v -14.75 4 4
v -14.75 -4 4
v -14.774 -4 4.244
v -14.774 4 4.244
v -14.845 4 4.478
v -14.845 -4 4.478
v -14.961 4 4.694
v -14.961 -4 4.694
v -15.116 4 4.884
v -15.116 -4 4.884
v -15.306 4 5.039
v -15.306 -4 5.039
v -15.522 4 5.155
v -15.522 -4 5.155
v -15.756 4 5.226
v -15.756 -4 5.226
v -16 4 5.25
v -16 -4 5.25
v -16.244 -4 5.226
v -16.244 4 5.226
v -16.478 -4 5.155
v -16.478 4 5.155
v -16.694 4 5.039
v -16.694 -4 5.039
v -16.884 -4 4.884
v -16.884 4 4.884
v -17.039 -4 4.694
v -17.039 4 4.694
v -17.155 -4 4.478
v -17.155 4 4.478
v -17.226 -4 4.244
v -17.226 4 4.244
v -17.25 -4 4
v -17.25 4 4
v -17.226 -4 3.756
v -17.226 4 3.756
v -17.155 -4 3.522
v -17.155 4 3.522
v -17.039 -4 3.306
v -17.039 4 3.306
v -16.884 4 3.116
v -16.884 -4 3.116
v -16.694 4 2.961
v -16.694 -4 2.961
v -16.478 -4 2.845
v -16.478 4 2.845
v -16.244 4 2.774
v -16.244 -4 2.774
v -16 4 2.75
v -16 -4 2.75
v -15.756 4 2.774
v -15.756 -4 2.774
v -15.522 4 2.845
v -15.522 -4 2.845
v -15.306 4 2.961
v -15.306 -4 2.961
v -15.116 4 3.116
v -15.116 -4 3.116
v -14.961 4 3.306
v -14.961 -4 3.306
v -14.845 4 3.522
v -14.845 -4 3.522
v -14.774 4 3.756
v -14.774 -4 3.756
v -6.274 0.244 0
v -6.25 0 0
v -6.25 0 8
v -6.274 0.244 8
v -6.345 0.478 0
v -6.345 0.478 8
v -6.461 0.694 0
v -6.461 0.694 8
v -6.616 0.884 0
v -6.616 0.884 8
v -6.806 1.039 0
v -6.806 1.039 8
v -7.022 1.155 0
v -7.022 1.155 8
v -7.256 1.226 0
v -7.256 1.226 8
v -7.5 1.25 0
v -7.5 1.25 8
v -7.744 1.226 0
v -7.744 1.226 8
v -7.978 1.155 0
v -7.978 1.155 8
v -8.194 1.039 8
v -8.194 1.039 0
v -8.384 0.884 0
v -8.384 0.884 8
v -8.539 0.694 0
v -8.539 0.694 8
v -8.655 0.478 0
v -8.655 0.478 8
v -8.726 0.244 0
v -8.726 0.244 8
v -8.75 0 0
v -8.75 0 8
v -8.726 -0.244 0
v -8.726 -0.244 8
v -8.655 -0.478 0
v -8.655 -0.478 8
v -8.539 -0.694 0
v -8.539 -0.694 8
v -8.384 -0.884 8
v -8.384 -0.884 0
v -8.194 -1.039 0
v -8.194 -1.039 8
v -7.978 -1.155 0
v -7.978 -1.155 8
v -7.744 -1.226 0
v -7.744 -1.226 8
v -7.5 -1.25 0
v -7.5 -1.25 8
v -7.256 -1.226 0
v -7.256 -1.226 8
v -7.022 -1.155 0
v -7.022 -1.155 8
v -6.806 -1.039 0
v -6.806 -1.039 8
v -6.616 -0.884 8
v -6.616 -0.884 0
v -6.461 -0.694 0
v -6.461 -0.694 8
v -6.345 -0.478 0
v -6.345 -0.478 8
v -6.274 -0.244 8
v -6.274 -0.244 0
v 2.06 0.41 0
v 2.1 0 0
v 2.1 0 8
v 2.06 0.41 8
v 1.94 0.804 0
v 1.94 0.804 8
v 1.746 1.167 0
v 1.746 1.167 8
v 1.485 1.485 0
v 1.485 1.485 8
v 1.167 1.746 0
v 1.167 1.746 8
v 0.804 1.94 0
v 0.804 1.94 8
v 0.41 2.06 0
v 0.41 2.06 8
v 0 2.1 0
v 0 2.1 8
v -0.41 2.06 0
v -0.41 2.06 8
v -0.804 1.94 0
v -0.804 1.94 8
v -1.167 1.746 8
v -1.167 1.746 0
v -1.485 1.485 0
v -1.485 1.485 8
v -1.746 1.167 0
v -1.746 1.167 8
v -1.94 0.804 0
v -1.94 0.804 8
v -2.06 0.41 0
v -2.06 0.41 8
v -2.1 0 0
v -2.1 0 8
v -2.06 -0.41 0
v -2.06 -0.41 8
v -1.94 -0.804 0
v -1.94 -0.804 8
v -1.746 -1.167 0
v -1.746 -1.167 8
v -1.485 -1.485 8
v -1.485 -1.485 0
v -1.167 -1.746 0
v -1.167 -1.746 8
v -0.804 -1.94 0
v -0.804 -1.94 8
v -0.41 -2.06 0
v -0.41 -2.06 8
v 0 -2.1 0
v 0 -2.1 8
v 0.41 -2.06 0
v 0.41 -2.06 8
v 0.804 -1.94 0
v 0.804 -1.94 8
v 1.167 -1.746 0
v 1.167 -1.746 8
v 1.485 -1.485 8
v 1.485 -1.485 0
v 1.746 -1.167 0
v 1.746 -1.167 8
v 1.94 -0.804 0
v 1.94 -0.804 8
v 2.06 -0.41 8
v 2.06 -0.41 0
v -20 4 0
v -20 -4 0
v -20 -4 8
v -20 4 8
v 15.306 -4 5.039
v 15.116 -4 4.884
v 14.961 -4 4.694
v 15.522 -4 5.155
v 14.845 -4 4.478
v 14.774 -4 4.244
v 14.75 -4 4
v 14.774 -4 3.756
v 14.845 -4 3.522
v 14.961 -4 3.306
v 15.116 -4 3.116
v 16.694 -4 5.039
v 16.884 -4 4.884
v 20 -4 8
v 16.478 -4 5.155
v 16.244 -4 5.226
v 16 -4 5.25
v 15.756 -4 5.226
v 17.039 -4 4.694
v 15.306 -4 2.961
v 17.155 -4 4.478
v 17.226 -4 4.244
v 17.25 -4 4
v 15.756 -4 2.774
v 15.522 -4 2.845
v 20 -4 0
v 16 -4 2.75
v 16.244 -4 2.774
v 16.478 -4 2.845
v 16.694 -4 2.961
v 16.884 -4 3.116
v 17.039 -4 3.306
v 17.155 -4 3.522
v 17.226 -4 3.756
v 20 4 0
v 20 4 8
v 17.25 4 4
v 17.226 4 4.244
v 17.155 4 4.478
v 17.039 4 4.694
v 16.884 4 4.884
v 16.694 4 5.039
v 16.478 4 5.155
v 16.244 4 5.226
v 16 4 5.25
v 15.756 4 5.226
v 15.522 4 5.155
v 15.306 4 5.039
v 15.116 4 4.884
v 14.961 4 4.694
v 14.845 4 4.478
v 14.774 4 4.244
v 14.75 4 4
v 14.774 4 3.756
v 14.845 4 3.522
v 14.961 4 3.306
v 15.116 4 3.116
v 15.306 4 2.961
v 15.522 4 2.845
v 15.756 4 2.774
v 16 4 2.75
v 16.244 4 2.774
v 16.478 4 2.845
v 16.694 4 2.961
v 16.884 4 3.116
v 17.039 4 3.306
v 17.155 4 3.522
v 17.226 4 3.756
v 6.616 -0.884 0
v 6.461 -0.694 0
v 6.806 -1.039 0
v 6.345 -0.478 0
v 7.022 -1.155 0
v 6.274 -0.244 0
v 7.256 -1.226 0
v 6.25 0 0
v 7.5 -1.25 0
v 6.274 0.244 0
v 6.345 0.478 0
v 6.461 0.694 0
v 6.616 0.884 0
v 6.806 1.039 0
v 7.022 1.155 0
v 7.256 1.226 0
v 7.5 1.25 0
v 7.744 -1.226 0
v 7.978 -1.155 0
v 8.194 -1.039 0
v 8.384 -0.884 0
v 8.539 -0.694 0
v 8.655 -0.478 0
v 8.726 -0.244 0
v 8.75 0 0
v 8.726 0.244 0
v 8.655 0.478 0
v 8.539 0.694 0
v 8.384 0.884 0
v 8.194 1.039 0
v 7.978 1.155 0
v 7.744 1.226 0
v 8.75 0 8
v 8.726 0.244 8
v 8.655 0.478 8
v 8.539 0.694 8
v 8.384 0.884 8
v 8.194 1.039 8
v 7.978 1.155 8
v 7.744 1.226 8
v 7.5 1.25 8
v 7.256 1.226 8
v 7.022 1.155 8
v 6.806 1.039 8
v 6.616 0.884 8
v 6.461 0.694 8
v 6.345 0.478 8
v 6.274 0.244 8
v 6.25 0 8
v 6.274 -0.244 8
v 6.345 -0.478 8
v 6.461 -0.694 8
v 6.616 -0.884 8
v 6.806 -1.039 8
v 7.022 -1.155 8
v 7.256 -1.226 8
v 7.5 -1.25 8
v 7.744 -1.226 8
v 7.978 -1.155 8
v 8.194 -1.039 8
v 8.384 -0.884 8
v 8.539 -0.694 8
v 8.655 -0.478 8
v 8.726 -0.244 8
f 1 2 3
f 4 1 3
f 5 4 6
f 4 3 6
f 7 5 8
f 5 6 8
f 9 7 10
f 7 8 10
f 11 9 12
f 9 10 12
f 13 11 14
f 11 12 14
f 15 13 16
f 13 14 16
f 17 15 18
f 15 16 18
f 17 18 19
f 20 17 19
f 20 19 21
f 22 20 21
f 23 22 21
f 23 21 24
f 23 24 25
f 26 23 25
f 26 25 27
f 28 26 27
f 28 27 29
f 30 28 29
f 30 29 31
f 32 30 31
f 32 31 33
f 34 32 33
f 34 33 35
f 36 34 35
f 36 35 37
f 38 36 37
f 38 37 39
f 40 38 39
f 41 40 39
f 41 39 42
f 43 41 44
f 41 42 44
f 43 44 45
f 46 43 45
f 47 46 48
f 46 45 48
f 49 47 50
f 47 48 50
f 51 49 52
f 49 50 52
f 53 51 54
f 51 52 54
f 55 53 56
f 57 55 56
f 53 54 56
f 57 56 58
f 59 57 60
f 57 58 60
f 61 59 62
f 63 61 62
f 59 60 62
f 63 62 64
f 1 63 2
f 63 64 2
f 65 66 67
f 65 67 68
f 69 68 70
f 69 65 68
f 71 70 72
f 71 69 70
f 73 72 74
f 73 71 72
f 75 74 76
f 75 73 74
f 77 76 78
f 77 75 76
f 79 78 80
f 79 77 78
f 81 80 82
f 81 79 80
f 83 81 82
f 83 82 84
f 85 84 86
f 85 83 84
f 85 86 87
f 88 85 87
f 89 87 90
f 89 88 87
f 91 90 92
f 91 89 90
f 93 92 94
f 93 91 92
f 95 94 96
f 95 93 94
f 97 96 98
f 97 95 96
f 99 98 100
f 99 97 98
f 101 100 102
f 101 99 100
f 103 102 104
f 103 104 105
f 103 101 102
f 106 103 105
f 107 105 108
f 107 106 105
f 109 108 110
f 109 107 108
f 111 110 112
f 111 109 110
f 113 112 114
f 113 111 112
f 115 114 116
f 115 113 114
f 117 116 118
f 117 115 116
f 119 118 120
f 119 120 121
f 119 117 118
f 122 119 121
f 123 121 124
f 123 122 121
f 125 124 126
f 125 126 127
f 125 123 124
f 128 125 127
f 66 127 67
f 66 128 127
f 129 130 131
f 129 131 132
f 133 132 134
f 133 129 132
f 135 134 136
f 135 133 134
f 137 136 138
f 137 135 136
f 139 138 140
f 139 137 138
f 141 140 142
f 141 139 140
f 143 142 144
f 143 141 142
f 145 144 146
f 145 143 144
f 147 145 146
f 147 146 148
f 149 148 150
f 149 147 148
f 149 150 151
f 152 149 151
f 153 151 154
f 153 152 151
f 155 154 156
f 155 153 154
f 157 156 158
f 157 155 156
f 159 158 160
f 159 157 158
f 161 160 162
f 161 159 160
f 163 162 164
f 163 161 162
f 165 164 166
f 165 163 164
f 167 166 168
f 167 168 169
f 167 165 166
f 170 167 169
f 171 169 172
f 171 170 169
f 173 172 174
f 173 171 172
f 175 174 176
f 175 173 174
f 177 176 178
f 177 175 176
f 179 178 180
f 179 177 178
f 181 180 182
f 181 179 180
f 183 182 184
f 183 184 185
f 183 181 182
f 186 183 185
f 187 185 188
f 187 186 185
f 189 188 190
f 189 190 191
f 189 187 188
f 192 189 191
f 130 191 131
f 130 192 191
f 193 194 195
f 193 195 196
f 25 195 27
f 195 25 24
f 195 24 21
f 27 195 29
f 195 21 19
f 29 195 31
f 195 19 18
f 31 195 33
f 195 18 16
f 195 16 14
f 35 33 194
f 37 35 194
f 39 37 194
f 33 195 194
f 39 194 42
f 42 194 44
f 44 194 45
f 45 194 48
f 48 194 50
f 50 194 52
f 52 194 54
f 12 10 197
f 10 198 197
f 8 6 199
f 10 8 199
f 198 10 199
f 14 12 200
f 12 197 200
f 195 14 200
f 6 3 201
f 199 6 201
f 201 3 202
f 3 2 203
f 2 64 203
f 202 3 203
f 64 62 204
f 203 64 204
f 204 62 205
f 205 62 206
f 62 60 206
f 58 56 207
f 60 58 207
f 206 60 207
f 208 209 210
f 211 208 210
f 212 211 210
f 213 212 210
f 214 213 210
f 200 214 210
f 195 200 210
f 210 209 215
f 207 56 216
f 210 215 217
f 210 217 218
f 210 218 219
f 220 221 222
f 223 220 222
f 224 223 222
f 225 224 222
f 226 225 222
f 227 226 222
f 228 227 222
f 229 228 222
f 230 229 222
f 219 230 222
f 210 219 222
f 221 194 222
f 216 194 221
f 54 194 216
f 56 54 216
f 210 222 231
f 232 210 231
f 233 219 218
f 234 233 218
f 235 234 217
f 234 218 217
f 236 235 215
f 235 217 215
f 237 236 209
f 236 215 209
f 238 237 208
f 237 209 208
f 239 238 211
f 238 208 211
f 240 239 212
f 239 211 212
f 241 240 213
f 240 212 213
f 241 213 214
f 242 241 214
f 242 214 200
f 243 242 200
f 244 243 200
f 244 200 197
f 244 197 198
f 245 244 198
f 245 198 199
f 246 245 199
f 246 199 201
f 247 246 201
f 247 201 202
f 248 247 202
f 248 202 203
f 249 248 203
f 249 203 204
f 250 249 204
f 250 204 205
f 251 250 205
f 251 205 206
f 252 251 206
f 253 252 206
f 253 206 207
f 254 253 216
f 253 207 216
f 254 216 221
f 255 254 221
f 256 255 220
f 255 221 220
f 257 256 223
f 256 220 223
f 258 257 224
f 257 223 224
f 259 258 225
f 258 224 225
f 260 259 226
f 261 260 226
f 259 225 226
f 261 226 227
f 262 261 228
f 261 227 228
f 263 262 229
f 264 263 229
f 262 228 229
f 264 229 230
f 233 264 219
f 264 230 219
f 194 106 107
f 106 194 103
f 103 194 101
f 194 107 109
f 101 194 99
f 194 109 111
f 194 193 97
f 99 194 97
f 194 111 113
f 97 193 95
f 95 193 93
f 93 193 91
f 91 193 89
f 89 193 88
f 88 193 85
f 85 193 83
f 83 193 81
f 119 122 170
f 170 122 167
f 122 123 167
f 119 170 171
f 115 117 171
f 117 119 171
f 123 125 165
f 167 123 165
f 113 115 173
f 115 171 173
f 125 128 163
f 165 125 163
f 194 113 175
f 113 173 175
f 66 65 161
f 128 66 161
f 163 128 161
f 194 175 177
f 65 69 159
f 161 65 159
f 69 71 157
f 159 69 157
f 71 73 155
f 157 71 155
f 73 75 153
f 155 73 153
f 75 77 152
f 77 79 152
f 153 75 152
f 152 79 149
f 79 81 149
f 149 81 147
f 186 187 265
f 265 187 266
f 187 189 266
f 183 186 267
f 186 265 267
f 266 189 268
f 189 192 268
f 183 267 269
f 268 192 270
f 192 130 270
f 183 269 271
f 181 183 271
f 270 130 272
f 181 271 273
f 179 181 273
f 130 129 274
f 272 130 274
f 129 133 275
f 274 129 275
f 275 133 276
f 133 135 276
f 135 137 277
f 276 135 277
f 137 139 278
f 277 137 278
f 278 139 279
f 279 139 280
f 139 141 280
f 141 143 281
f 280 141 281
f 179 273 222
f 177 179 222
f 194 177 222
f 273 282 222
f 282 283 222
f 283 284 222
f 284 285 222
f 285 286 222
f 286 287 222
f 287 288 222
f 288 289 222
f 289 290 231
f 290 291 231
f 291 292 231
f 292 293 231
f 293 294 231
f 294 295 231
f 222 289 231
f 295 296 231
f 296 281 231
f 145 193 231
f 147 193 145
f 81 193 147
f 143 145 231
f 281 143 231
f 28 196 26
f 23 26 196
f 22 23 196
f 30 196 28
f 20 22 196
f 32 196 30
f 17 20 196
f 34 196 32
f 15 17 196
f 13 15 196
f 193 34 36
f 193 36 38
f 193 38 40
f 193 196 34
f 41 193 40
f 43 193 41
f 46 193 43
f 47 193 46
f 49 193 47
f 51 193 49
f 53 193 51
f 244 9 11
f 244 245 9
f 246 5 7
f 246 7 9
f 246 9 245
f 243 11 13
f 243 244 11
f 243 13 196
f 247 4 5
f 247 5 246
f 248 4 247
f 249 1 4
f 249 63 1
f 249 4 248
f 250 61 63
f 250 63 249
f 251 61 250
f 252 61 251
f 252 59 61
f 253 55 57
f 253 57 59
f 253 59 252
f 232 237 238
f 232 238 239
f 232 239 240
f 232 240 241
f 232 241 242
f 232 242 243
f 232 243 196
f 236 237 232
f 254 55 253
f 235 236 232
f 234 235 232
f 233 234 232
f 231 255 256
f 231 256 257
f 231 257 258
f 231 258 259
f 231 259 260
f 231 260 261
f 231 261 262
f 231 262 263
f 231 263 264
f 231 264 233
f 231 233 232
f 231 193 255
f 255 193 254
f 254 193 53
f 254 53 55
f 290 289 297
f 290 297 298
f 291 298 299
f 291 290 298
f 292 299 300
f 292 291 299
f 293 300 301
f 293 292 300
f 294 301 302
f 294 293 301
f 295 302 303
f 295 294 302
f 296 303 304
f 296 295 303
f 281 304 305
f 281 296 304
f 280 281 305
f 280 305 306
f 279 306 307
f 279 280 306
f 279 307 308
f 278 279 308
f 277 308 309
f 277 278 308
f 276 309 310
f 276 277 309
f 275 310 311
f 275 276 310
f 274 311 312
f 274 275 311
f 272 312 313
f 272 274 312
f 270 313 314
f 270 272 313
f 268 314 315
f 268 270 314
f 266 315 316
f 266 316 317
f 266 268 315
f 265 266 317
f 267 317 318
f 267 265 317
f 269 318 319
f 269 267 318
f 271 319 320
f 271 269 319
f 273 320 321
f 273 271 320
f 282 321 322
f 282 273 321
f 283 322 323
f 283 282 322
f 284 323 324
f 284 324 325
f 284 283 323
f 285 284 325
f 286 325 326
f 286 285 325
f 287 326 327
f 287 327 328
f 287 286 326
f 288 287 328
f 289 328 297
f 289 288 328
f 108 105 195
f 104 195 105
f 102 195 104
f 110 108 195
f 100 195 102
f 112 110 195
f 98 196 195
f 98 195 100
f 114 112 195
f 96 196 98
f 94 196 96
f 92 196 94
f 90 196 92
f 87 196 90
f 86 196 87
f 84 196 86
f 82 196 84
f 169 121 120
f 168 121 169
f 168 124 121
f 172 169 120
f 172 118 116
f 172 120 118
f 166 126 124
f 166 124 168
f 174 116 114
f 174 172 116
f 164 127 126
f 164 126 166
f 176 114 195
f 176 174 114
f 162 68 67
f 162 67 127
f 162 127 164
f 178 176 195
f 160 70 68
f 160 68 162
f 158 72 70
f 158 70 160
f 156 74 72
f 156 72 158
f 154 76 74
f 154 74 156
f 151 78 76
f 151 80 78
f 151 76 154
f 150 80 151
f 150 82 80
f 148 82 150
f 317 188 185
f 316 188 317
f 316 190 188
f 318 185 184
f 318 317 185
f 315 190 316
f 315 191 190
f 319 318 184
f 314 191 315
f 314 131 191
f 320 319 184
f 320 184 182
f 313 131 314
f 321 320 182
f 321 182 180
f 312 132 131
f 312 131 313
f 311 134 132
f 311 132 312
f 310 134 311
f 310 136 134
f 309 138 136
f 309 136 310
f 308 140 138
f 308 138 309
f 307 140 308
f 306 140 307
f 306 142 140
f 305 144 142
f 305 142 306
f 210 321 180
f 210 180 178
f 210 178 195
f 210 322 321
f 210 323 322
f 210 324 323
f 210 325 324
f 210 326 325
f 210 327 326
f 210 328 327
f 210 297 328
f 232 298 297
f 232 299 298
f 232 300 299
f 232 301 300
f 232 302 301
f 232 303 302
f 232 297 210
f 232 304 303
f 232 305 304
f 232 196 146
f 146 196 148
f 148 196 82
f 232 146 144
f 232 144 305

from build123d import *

# Parameters (mm, degrees)
SKETCH1_W           = 40
SKETCH1_H           = 8
SKETCH1_R           = 2.1
SKETCH1_R_2         = 1.25
BOSS_EXTRUDE1_DEPTH = 8
SKETCH2_R           = 1.25
CUT_EXTRUDE1_DEPTH  = 9


with BuildPart() as part:
    # Sketch1 → Boss-Extrude1 (new body)
    with BuildSketch(Plane.XY):
        Rectangle(SKETCH1_W, SKETCH1_H)
        Circle(SKETCH1_R, mode=Mode.SUBTRACT)
        with Locations((7.5, 0)):
            Circle(SKETCH1_R_2, mode=Mode.SUBTRACT)
        with Locations((-7.5, 0)):
            Circle(SKETCH1_R_2, mode=Mode.SUBTRACT)
    extrude(amount=BOSS_EXTRUDE1_DEPTH)

    # Sketch2 → Cut-Extrude1 (cut, through all)
    with BuildSketch(Plane.XZ.offset(4)):
        with Locations((-16, 4)):
            Circle(SKETCH2_R)
        with Locations((16, 4)):
            Circle(SKETCH2_R)
    extrude(amount=-CUT_EXTRUDE1_DEPTH, mode=Mode.SUBTRACT)


solid = part.part
